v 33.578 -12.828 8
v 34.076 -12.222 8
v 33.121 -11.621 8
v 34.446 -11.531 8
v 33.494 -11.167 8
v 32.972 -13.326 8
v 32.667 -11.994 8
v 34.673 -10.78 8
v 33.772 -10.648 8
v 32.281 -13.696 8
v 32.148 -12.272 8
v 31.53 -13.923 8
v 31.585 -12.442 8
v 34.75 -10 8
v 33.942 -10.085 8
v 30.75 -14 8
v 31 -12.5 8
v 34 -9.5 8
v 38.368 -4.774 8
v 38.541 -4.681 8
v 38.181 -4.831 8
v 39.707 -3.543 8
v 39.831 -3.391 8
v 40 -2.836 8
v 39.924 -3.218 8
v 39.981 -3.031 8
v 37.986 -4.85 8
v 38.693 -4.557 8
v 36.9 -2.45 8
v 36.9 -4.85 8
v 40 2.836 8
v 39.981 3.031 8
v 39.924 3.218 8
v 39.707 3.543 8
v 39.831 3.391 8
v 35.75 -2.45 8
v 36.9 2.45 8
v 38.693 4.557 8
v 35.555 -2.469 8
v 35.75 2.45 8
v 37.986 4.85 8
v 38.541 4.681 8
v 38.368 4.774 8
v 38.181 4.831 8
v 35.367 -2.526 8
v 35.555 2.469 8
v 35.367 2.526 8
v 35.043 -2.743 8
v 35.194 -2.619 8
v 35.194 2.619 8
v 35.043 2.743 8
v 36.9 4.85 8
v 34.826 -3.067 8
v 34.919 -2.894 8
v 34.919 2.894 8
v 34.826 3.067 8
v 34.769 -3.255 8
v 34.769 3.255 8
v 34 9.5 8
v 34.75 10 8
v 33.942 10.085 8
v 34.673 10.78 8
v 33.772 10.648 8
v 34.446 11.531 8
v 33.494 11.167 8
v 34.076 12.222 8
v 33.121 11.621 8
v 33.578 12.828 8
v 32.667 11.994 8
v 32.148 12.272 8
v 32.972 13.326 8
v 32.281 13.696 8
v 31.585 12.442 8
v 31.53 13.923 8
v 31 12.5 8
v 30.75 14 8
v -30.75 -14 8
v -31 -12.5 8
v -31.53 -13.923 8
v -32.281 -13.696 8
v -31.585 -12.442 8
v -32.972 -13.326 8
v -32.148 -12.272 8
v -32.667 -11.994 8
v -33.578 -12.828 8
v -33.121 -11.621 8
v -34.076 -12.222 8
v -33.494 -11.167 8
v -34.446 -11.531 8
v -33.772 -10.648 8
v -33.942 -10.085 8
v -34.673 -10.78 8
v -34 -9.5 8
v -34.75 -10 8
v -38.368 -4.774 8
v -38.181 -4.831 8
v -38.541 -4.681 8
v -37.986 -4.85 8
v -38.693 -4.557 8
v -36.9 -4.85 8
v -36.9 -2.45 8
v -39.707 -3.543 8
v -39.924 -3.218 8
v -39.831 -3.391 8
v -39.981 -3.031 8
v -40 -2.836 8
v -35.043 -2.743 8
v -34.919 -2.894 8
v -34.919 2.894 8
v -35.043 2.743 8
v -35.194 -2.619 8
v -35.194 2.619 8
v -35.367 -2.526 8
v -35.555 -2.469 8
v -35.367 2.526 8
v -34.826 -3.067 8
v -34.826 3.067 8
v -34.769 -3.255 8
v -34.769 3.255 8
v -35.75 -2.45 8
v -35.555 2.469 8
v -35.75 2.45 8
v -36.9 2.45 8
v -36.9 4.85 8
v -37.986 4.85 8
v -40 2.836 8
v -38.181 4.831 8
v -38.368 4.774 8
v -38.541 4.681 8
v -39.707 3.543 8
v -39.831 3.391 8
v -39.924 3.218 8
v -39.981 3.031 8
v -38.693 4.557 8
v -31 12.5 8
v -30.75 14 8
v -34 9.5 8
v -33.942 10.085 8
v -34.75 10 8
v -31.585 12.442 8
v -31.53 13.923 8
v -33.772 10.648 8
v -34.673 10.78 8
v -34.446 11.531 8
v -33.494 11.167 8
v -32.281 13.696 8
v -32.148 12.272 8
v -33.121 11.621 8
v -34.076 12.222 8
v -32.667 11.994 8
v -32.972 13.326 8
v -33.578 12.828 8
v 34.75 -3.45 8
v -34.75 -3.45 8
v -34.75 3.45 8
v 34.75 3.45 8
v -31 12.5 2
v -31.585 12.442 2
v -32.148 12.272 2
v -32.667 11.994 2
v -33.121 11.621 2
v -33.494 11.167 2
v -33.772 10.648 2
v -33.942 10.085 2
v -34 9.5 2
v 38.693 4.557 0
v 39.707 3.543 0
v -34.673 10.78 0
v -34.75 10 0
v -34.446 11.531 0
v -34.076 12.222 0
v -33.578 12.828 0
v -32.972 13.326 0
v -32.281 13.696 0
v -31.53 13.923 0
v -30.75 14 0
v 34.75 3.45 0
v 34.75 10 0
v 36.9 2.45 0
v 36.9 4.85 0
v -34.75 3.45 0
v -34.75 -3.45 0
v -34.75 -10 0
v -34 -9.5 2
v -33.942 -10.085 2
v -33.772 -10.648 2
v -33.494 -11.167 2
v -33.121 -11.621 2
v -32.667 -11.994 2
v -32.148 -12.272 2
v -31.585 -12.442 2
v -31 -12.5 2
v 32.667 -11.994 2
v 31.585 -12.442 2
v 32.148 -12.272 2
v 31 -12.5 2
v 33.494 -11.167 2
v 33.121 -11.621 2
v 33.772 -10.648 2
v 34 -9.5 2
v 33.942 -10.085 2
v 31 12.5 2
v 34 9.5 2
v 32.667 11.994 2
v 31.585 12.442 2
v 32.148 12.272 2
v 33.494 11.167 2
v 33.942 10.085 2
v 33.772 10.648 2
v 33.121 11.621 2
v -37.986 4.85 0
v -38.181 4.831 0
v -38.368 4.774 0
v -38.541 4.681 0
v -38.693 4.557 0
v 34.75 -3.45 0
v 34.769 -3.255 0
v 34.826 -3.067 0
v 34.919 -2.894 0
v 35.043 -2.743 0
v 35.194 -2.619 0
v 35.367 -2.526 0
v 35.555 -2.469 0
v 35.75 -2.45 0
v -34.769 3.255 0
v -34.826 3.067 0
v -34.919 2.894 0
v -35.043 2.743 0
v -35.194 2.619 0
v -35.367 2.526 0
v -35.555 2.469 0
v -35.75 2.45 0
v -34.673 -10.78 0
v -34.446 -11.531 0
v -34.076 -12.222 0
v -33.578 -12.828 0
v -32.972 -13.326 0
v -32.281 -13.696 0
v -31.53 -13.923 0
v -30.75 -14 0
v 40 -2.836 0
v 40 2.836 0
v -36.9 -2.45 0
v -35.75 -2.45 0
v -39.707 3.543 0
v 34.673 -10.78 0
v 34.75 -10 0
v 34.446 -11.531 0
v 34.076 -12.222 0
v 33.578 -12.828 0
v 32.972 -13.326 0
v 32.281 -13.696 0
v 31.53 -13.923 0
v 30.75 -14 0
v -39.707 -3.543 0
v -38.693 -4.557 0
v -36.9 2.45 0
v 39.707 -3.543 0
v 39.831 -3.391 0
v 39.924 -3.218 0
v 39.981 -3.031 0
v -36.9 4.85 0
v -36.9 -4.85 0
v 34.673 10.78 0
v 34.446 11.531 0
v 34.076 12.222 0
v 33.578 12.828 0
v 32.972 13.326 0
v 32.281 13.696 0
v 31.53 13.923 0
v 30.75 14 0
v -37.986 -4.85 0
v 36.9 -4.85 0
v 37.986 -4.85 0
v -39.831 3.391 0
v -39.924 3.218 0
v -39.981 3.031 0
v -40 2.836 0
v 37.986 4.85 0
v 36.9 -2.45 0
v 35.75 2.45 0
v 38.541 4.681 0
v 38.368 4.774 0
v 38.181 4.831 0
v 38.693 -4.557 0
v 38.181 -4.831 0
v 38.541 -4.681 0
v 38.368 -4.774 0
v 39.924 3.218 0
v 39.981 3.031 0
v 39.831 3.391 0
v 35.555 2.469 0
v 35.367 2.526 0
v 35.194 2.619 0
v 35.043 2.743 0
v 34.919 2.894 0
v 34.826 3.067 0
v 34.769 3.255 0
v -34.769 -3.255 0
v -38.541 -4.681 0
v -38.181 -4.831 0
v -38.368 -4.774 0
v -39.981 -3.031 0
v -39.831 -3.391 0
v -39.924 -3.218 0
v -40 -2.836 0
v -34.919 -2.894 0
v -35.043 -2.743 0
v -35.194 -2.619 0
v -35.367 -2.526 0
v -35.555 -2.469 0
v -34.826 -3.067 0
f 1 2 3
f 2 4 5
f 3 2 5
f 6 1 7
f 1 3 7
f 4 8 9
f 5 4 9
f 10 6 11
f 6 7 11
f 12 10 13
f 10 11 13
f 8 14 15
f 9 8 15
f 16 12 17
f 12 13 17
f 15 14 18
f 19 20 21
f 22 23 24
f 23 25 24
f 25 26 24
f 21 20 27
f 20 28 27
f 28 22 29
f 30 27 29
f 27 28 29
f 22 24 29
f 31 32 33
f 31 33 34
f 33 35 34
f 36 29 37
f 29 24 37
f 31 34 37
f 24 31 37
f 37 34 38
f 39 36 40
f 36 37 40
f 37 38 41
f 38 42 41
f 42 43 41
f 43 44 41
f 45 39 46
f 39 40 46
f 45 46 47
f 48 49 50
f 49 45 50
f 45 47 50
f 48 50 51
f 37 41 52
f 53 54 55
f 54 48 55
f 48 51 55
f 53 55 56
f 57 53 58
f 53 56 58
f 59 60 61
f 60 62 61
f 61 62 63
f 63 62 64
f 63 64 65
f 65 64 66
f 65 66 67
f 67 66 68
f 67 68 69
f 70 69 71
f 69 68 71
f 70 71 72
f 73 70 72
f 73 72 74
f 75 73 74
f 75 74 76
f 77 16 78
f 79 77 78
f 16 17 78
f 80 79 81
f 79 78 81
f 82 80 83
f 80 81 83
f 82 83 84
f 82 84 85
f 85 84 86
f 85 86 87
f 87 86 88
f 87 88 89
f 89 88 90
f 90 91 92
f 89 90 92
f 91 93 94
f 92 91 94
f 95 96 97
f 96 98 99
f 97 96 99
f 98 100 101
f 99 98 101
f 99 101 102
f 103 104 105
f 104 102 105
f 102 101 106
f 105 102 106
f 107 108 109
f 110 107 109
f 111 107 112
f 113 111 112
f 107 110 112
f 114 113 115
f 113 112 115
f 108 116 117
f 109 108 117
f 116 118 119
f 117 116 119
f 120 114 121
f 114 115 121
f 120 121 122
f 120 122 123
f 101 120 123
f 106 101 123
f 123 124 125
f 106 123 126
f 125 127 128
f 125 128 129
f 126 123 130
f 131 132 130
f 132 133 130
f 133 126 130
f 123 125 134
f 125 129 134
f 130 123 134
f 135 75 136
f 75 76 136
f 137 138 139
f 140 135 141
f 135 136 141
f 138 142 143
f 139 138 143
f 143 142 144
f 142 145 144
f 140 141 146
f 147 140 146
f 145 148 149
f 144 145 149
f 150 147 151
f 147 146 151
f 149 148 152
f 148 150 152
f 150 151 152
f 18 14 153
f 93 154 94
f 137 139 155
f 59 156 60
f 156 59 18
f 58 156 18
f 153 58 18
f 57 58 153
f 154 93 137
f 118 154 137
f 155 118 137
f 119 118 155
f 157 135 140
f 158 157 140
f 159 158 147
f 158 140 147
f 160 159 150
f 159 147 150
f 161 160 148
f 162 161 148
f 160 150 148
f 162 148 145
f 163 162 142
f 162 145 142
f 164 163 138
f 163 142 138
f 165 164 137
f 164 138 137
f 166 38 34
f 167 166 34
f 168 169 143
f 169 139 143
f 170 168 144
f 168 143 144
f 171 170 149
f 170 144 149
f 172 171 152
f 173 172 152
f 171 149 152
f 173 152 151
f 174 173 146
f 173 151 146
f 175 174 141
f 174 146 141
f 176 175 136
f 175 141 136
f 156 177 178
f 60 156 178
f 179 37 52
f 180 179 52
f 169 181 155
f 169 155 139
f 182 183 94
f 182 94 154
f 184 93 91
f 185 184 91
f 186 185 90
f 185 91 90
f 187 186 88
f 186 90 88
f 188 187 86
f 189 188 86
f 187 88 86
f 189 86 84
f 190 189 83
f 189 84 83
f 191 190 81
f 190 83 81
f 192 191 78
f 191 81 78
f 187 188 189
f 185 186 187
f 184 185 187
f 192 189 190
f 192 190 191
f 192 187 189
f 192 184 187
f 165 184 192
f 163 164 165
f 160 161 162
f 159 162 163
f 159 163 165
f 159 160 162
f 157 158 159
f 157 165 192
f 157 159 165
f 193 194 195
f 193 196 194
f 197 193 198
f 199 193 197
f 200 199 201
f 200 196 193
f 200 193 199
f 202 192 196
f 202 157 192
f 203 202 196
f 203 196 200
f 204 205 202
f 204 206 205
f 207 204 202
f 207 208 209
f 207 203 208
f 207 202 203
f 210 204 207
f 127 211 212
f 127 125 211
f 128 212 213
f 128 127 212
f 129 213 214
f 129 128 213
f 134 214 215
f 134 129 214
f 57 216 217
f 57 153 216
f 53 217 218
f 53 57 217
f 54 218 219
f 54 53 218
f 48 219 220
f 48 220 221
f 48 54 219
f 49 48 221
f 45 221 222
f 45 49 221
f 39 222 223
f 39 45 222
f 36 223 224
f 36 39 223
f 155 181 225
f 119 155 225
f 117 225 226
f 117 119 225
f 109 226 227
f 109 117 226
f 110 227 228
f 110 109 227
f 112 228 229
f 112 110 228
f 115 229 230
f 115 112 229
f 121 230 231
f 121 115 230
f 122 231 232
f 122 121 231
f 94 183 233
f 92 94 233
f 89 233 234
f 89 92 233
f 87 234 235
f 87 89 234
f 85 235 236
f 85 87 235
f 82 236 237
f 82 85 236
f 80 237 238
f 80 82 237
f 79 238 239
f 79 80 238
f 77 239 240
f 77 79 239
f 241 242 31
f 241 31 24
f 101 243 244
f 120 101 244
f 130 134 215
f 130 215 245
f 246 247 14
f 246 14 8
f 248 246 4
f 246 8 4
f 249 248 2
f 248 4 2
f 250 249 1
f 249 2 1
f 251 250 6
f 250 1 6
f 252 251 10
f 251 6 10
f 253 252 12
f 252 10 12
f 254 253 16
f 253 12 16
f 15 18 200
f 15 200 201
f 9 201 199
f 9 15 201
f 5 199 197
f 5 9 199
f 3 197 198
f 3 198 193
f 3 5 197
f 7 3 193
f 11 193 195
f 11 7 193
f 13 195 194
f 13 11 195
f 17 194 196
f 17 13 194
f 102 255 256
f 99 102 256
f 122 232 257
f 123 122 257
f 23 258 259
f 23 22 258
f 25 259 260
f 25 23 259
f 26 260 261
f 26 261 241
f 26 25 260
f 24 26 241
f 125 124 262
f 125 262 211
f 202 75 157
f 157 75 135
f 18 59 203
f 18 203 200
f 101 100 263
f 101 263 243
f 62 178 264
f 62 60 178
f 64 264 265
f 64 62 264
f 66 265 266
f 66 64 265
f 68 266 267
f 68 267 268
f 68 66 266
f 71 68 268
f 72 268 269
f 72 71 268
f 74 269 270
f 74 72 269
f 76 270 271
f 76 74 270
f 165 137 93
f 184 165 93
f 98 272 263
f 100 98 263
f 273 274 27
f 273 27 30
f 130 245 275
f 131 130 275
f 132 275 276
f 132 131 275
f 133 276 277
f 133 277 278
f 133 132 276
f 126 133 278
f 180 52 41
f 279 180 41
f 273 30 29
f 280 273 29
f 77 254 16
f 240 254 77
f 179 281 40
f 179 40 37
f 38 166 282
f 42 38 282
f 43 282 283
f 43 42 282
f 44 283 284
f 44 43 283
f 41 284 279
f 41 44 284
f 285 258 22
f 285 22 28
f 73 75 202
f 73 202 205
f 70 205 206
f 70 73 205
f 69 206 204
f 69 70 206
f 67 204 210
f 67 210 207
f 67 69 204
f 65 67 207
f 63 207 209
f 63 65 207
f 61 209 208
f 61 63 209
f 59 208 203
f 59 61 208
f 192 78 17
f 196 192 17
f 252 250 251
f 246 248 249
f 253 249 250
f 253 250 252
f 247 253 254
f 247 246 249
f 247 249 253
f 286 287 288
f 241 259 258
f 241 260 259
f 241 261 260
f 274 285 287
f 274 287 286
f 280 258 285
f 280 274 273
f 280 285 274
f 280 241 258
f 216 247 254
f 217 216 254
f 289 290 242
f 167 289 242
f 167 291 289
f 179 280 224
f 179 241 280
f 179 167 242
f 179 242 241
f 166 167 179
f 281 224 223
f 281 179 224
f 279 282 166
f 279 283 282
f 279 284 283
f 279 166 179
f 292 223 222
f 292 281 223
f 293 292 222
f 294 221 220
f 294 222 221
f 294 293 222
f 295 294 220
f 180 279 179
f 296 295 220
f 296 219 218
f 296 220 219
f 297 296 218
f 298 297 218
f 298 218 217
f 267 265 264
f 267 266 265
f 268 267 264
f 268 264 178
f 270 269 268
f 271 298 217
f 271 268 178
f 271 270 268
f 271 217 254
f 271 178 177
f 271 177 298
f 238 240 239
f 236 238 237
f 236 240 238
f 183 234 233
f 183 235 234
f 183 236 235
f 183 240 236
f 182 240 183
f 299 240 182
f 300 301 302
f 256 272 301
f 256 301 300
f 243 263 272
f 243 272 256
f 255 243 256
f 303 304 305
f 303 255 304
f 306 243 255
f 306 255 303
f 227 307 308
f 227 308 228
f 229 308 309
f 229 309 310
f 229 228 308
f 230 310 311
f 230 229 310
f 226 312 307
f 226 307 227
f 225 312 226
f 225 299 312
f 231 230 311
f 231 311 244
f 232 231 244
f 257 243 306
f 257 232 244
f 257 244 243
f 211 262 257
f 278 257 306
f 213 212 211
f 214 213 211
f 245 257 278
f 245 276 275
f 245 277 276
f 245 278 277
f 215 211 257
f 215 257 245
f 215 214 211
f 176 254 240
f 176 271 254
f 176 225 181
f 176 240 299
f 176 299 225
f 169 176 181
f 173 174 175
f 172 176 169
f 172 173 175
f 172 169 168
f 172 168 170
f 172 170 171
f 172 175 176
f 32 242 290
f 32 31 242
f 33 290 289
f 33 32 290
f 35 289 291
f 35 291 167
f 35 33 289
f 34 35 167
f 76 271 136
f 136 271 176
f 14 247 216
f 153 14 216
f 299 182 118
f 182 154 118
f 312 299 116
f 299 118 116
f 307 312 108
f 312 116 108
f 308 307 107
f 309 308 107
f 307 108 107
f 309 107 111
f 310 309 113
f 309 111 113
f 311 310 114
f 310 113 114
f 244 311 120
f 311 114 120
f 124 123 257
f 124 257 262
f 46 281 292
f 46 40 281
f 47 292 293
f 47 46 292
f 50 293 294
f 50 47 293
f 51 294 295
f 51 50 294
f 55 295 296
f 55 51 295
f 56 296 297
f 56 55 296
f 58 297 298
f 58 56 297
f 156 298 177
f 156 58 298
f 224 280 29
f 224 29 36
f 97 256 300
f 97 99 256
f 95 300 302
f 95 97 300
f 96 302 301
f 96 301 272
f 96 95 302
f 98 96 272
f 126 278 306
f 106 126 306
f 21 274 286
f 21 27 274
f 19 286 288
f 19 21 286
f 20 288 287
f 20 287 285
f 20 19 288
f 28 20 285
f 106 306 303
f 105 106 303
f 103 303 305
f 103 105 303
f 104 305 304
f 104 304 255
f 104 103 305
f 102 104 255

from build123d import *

# Parameters (mm, degrees)
ESQUISSE1_W             = 34.75
ESQUISSE1_H             = 28
BOSS_EXTRU_1_DEPTH      = 8
CONG_1_R                = 4
ENL_V_MAT_EXTRU_1_DEPTH = 6
BOSS_EXTRU_2_DEPTH      = 8
CONG_2_R                = 1
CONG_1_OF_SYM_TRIE1_R   = 4
CONG_2_OF_SYM_TRIE1_R   = 1


with BuildPart() as part:
    # Esquisse1 → Boss.-Extru.1 (new body)
    with BuildSketch(Plane.XY):
        with Locations((-17.375, 0)):
            Rectangle(ESQUISSE1_W, ESQUISSE1_H)
    boss_extru_1 = extrude(amount=BOSS_EXTRU_1_DEPTH)

    # Congé1
    cong_1_edges = [part.edges().sort_by_distance(p)[0] for p in [
        (-34.75, -14, 4),
        (-34.75, 14, 4),
    ]]
    fillet(cong_1_edges, radius=CONG_1_R)

    # Esquisse3 → Enlèv. mat.-Extru.1 (cut)
    with BuildSketch(Plane.XY.offset(8)):
        with BuildLine():
            Line((0, -12.5), (0, 12.5))
            Line((0, 12.5), (-31, 12.5))
            ThreePointArc((-31, 12.5), (-33.121320344, 11.621320344), (-34, 9.5))
            Line((-34, 9.5), (-34, -9.5))
            ThreePointArc((-34, -9.5), (-33.121320344, -11.621320344), (-31, -12.5))
            Line((-31, -12.5), (0, -12.5))
        make_face()
    enl_v_mat_extru_1 = extrude(amount=-ENL_V_MAT_EXTRU_1_DEPTH, mode=Mode.SUBTRACT)

    # Esquisse5 → Boss.-Extru.2 (add)
    with BuildSketch(Plane.XY):
        Polygon((-34.75, 2.45), (-36.9, 2.45), (-36.9, 4.85), (-38.4, 4.85), (-40, 3.25), (-40, -3.25), (-38.4, -4.85), (-36.9, -4.85), (-36.9, -2.45), (-34.75, -2.45), align=None)
    boss_extru_2 = extrude(amount=BOSS_EXTRU_2_DEPTH)

    # Congé2
    cong_2_edges = [part.edges().sort_by_distance(p)[0] for p in [
        (-38.4, -4.85, 4),
        (-40, -3.25, 4),
        (-40, 3.25, 4),
        (-38.4, 4.85, 4),
        (-34.75, 2.45, 4),
        (-34.75, -2.45, 4),
    ]]
    fillet(cong_2_edges, radius=CONG_2_R)

    # Symétrie1: Boss.-Extru.1, Enlèv. mat.-Extru.1, Boss.-Extru.2 across plane
    add(boss_extru_1.mirror(Plane(origin=(0, -14, 8), x_dir=(0, 0, 1), z_dir=(-1, 0, 0))))
    add(enl_v_mat_extru_1.mirror(Plane(origin=(0, -14, 8), x_dir=(0, 0, 1), z_dir=(-1, 0, 0))), mode=Mode.SUBTRACT)
    add(boss_extru_2.mirror(Plane(origin=(0, -14, 8), x_dir=(0, 0, 1), z_dir=(-1, 0, 0))))

    # Congé1 of Symétrie1
    cong_1_of_sym_trie1_edges = [part.edges().sort_by_distance(p)[0] for p in [
        (34.75, -14, 4),
        (34.75, 14, 4),
    ]]
    fillet(cong_1_of_sym_trie1_edges, radius=CONG_1_OF_SYM_TRIE1_R)

    # Congé2 of Symétrie1
    cong_2_of_sym_trie1_edges = [part.edges().sort_by_distance(p)[0] for p in [
        (38.4, -4.85, 4),
        (40, -3.25, 4),
        (40, 3.25, 4),
        (38.4, 4.85, 4),
        (34.75, 2.45, 4),
        (34.75, -2.45, 4),
    ]]
    fillet(cong_2_of_sym_trie1_edges, radius=CONG_2_OF_SYM_TRIE1_R)


solid = part.part
